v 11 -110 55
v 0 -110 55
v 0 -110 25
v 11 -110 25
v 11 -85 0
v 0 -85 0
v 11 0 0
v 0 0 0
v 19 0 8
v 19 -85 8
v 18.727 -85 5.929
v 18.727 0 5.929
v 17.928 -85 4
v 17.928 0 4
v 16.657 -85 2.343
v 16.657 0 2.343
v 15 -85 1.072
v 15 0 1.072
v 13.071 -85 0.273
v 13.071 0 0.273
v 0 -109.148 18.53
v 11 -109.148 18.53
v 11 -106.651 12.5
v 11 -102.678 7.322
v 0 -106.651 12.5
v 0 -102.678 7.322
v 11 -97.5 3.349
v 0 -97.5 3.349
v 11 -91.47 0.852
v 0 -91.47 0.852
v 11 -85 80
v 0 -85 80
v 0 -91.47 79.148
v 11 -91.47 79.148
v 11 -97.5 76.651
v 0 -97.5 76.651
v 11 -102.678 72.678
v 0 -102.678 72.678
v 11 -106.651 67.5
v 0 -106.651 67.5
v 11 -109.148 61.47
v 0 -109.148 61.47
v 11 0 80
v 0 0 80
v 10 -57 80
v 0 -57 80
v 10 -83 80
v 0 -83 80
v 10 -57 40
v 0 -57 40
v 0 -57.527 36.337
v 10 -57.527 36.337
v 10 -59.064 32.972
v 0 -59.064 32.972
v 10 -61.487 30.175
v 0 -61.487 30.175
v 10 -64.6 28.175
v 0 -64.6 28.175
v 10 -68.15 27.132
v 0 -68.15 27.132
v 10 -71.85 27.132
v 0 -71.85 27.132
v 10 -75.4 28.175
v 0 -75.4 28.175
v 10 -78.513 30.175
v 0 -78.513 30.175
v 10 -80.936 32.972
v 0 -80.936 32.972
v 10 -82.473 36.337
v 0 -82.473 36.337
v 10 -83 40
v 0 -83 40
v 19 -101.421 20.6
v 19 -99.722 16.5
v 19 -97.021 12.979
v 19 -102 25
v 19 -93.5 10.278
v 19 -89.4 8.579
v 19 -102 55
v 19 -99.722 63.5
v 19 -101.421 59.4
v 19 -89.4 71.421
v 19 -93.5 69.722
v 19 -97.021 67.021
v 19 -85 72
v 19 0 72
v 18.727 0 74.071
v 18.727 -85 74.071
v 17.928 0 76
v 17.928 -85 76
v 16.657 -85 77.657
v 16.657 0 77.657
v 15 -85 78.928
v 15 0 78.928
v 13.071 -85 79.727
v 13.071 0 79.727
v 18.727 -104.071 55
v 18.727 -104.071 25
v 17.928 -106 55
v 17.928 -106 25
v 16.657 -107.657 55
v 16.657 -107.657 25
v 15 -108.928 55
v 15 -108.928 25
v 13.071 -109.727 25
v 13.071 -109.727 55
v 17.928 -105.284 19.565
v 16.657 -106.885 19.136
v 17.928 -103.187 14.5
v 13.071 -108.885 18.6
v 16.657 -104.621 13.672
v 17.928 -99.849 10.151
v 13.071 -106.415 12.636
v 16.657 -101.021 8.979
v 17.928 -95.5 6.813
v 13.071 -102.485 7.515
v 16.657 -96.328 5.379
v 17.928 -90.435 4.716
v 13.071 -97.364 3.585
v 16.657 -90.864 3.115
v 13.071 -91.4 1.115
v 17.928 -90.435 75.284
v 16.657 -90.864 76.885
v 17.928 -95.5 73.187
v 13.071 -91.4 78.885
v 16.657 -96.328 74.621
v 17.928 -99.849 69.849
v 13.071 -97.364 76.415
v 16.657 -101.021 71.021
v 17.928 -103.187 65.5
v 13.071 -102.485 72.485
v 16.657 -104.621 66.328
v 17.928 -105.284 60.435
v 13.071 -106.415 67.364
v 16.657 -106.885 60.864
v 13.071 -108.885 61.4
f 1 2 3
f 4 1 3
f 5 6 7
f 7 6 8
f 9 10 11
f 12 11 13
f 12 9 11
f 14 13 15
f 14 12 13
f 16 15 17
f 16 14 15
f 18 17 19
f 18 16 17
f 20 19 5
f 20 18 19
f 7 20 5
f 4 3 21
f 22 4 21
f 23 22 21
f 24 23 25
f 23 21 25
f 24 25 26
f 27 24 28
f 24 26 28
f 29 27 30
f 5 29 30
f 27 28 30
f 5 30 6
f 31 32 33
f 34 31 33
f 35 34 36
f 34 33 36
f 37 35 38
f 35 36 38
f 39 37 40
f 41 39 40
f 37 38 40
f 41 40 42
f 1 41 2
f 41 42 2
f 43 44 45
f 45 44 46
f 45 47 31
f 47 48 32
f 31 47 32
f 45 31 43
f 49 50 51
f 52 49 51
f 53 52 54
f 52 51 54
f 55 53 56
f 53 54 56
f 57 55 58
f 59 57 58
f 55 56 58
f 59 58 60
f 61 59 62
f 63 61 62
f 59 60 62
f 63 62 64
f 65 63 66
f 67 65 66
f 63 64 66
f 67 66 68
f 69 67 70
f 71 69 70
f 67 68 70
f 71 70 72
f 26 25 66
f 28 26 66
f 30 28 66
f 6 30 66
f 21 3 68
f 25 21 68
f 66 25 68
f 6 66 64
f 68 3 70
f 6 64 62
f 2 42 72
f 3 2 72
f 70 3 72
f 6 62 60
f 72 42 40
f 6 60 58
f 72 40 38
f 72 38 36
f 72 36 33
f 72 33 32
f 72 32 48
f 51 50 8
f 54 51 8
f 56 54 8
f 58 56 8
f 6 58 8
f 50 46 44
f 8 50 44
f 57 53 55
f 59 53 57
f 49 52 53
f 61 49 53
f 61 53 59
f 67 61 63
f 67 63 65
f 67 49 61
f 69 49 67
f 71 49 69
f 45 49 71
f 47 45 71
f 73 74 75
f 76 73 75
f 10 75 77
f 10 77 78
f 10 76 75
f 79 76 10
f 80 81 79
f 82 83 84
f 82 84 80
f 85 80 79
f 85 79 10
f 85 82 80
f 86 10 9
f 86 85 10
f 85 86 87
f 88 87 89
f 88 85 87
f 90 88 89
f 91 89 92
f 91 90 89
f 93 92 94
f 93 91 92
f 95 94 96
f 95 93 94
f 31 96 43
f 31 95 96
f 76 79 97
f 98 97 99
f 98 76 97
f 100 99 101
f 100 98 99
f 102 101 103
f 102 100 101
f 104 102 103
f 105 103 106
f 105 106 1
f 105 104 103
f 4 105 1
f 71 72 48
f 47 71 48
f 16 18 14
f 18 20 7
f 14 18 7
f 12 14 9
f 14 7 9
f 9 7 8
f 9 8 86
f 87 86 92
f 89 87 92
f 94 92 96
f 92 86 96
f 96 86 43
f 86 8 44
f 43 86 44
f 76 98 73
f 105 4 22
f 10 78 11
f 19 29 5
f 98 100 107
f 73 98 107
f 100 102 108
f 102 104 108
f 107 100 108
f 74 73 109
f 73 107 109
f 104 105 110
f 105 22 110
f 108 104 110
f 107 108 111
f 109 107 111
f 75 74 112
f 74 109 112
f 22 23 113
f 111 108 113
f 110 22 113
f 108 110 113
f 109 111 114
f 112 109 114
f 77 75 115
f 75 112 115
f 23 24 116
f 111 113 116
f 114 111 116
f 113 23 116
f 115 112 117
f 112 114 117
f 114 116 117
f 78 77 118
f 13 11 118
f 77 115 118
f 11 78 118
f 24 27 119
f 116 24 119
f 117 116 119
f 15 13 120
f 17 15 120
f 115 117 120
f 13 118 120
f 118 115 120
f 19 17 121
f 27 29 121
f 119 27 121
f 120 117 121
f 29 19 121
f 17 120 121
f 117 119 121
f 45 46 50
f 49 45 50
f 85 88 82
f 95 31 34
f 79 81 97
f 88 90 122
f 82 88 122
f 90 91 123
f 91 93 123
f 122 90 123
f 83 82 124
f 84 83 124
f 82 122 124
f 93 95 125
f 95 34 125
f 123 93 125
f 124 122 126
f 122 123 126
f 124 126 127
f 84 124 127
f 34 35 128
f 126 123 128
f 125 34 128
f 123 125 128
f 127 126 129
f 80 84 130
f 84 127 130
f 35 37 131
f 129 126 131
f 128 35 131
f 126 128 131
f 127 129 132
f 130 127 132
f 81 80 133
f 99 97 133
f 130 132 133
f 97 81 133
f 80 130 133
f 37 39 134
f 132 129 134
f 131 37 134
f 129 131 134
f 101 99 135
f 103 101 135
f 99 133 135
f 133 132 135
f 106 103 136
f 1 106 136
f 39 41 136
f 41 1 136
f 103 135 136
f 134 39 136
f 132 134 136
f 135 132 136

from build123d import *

# Parameters (mm, degrees)
F1_DEPTH = 19
F3_DEPTH = 10
F4_R     = 8


with BuildPart() as f1:
    # F0 (on Right) → F1 (new body)
    with BuildSketch(Plane.YZ):
        with BuildLine():
            Line((-85, 0), (0, 0))
            Line((0, 0), (0, 80))
            Line((0, 80), (-85, 80))
            ThreePointArc((-85, 80), (-102.67767, 72.67767), (-110, 55))
            Line((-110, 55), (-110, 25))
            ThreePointArc((-110, 25), (-102.67767, 7.32233), (-85, 0))
        make_face()
    extrude(amount=F1_DEPTH)

    # F2 (on face) → F3 (cut)
    with BuildSketch(Plane(origin=(0, 0, 0), x_dir=(0, -1, 0), z_dir=(-1, 0, 0))):
        with BuildLine():
            Line((57, 80), (57, 40))
            ThreePointArc((57, 40), (70, 27), (83, 40))
            Line((83, 40), (83, 80))
            Line((83, 80), (57, 80))
        make_face()
    extrude(amount=-F3_DEPTH, mode=Mode.SUBTRACT)

    # F4
    f4_edges = [f1.edges().sort_by_distance(p)[0] for p in [
        (19, -42.5, 80),
    ]]
    fillet(f4_edges, radius=F4_R)


solid = f1.part
